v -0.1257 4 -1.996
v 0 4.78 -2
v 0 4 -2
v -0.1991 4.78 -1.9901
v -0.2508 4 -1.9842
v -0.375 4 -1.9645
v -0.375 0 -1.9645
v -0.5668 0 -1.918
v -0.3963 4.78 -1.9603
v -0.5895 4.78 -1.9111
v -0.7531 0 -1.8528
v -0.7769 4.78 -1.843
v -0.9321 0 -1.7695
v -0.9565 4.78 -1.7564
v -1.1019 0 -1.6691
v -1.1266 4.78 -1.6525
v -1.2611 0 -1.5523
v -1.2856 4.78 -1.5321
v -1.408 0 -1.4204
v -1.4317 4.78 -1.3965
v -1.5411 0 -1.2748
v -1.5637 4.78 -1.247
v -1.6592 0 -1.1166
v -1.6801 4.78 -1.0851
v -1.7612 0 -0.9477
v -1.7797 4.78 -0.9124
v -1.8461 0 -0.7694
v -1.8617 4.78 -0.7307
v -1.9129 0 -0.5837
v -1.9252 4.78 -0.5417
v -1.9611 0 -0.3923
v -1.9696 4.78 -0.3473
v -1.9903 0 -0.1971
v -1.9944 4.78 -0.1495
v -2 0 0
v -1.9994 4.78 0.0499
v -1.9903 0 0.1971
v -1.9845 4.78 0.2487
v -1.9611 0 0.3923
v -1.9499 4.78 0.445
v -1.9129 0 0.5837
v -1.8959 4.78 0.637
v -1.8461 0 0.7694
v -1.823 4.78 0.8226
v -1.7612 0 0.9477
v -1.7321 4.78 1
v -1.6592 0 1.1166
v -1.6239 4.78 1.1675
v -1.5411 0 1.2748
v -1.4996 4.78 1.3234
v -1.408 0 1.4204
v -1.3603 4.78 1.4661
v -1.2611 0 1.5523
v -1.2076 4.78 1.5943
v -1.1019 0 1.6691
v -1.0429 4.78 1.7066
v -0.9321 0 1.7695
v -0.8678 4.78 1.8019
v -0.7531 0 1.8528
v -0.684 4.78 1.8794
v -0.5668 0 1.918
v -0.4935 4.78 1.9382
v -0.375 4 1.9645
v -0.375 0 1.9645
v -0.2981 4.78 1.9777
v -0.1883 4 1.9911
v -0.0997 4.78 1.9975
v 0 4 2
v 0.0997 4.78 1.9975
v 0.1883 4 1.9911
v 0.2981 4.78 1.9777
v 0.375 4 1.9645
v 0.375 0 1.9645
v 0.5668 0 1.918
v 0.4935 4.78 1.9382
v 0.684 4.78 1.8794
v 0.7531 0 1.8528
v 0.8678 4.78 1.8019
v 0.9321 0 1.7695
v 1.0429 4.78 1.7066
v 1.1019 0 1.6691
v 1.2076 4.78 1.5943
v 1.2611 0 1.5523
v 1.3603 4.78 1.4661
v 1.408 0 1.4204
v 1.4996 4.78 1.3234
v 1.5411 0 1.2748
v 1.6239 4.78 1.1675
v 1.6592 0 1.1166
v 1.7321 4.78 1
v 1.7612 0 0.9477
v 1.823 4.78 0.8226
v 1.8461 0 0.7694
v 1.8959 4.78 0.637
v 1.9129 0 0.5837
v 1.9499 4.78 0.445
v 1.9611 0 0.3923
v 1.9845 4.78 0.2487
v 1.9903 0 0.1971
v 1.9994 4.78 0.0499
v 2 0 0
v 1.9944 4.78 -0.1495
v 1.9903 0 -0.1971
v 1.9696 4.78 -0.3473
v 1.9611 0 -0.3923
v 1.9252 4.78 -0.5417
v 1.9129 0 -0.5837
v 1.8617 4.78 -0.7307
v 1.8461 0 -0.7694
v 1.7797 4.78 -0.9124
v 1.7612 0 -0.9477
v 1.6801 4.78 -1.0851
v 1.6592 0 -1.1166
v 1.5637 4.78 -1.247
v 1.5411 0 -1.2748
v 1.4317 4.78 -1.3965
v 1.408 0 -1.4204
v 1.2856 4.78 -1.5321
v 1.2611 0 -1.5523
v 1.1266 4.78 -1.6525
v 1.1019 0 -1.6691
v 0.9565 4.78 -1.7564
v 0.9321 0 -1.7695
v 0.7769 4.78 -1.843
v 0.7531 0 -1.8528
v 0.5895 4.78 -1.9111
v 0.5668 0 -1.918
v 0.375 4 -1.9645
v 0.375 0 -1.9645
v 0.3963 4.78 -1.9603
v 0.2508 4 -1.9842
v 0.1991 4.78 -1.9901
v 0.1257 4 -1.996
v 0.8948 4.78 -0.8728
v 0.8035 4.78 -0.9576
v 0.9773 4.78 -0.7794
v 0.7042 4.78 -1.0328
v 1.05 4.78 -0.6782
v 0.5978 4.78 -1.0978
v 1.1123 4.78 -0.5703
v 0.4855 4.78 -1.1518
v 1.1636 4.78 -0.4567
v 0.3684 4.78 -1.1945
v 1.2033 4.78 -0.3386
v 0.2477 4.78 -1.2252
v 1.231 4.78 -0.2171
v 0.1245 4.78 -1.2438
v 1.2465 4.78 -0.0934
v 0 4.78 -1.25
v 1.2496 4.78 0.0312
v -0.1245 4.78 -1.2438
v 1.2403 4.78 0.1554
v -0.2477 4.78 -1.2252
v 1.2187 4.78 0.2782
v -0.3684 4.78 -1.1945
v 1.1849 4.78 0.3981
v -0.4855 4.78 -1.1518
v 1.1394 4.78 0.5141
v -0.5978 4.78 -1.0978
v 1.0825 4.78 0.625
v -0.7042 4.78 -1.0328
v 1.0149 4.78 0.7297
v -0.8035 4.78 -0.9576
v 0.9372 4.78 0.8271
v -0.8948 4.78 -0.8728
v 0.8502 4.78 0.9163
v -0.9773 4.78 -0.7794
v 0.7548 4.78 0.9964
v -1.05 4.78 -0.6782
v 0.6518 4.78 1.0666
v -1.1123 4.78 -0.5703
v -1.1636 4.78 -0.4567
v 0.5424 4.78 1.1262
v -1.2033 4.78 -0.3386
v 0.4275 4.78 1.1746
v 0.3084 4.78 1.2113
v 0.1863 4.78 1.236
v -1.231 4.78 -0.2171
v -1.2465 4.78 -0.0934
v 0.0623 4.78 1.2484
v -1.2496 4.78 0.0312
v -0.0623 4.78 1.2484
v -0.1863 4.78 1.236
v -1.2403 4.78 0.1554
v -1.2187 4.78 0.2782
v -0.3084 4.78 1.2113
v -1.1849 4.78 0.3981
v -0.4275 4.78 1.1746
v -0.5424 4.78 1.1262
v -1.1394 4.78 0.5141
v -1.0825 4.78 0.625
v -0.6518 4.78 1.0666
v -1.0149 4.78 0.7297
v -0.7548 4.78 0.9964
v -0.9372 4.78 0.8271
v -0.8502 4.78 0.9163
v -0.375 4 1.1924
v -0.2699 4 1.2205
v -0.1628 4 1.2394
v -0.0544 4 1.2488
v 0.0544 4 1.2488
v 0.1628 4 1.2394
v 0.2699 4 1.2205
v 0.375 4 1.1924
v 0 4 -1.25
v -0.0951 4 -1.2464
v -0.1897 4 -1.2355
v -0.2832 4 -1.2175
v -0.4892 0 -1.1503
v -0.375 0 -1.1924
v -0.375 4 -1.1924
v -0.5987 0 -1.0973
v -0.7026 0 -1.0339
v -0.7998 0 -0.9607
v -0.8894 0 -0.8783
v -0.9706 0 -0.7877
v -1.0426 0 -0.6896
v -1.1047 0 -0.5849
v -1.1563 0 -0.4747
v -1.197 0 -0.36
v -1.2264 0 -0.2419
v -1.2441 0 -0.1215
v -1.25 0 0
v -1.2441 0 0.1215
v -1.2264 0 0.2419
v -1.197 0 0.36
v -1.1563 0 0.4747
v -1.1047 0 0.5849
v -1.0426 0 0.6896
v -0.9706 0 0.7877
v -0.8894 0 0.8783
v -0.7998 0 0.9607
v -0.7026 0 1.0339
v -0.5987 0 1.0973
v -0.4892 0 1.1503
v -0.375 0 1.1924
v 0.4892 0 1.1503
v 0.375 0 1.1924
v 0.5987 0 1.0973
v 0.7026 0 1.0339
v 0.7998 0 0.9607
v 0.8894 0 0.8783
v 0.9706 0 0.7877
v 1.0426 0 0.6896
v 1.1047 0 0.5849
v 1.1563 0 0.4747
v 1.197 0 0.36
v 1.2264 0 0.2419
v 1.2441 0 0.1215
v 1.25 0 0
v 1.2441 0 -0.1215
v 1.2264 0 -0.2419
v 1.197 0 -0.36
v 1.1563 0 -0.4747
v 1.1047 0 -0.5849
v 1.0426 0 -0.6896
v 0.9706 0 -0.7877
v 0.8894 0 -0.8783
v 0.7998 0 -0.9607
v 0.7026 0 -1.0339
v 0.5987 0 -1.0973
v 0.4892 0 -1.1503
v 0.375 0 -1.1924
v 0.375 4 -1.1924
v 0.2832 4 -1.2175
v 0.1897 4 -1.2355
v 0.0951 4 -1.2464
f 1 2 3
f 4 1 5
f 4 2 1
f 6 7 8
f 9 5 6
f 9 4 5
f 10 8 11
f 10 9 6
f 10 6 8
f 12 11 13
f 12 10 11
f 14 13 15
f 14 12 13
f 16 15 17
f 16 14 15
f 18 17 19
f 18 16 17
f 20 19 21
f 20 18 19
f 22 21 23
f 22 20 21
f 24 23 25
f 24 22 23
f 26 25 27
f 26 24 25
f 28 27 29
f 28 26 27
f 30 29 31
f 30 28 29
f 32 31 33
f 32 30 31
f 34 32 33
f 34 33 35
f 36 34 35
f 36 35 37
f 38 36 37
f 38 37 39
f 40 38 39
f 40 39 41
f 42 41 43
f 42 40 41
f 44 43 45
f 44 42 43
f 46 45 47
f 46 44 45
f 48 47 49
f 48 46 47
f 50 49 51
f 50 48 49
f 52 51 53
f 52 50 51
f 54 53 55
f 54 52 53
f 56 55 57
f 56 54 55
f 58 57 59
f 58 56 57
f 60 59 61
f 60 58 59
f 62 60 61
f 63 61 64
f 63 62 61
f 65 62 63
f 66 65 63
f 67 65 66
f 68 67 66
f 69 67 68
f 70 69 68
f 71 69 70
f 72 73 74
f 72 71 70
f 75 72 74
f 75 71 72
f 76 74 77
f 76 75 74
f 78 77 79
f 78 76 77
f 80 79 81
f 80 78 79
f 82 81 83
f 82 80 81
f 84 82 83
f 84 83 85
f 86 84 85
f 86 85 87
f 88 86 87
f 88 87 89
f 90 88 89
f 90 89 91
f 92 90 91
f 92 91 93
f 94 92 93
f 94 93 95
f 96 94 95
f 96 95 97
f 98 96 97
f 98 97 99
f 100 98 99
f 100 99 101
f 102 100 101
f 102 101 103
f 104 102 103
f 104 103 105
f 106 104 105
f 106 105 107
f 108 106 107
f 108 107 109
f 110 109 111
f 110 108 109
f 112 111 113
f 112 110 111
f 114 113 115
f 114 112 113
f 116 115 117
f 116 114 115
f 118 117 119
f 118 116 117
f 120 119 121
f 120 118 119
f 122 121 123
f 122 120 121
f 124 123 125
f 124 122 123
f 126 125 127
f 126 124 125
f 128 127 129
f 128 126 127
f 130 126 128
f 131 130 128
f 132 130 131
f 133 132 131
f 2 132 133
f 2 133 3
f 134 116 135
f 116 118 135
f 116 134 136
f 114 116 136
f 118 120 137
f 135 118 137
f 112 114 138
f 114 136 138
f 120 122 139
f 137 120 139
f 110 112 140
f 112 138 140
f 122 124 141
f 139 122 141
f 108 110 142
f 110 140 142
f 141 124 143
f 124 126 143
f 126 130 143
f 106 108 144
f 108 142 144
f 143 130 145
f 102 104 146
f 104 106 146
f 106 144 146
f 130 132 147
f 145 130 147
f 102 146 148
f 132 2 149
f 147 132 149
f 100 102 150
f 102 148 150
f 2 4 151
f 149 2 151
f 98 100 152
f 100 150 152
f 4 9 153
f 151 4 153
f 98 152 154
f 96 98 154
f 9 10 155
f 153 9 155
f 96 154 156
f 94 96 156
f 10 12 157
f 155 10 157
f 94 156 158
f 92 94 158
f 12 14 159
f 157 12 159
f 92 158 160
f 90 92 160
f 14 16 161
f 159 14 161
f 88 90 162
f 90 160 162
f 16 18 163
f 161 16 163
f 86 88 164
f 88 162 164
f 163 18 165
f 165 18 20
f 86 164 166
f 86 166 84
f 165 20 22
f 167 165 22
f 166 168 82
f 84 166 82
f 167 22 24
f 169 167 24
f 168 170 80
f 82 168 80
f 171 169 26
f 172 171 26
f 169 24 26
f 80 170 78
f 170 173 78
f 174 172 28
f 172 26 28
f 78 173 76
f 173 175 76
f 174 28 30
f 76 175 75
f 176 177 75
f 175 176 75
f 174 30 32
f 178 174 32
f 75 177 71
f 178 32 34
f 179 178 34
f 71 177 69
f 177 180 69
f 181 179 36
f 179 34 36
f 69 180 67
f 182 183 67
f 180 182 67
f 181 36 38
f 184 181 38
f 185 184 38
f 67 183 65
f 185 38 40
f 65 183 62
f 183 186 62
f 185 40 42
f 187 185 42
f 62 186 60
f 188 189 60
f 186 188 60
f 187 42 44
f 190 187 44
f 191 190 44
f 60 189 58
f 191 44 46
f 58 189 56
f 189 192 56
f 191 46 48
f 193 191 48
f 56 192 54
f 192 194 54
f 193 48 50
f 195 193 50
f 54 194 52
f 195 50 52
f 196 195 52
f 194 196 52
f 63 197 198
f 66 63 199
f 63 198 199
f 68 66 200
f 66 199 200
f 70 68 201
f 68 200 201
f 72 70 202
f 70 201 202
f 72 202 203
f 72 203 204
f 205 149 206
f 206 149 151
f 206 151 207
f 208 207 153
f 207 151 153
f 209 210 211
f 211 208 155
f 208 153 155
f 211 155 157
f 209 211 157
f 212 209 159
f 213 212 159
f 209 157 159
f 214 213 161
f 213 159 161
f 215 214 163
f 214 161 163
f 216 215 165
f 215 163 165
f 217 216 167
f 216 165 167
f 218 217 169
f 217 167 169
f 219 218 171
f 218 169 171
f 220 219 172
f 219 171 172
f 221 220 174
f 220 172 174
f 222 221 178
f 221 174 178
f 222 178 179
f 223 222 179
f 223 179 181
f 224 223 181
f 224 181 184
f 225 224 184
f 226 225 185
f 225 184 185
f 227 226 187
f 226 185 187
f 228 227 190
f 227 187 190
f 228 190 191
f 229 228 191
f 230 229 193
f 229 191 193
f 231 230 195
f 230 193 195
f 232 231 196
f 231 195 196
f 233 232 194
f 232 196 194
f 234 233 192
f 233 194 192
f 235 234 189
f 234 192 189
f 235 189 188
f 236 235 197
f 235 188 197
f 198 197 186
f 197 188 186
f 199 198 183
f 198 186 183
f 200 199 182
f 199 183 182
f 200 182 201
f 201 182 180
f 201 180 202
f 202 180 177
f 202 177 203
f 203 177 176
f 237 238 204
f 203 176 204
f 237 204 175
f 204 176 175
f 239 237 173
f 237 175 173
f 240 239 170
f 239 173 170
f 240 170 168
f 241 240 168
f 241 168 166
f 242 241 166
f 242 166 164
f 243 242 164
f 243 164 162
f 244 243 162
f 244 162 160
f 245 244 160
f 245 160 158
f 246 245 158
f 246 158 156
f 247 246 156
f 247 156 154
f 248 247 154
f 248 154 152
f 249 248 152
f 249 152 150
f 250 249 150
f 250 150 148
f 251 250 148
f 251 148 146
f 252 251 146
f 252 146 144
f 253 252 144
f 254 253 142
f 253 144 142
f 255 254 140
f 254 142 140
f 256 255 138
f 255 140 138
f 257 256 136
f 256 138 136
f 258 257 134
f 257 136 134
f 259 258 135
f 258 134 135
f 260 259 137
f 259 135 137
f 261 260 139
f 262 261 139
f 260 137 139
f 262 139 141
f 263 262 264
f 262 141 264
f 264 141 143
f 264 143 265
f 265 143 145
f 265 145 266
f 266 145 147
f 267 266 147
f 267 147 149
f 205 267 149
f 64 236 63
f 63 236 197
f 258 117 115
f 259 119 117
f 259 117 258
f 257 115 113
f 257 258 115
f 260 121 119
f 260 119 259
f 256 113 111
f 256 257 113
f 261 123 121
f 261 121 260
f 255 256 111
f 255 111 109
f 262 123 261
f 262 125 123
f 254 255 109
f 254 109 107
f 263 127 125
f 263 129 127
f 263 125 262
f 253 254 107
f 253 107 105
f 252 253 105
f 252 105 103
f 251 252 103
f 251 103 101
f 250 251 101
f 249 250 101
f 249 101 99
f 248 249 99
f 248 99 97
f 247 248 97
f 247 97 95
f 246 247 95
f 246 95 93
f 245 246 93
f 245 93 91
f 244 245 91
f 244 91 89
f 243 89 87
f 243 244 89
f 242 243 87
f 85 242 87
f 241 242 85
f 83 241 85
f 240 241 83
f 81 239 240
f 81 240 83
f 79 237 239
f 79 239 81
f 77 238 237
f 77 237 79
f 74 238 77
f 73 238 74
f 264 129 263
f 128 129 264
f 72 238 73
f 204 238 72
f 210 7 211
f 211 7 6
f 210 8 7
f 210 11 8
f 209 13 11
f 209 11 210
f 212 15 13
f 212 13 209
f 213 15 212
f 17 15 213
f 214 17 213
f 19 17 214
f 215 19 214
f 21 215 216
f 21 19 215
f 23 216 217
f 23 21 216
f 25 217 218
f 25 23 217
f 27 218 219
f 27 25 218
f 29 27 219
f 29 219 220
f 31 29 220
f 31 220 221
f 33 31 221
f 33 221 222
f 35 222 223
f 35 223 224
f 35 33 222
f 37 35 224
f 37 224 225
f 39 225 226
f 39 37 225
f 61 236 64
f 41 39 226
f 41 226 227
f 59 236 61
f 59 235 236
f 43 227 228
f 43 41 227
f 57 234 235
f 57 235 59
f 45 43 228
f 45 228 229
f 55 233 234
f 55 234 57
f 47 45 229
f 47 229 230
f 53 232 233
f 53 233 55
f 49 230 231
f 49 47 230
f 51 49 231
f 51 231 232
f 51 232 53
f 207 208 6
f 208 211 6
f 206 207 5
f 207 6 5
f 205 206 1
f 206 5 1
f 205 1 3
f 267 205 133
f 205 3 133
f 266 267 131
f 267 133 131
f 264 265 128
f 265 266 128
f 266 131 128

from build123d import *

# Parameters (mm, degrees)
SKETCH2_W               = 0.75
SKETCH2_H               = 4.78
CUT_EXTRUDE1_DEPTH      = 4.78
CUT_EXTRUDE1_DEPTH_BACK = 4.78
SKETCH3_W               = 0.75
SKETCH3_H               = 4


with BuildPart() as part:
    # Sketch2 → Revolve1 (revolve)
    with BuildSketch(Plane.XY):
        with Locations((1.625, 2.39)):
            Rectangle(SKETCH2_W, SKETCH2_H)
    revolve(axis=Axis((0, -55, 0), (0, 1, 0)))

    # Sketch3 → Cut-Extrude1 (cut, two sides: drawn at the far end of the back side and taken through both)
    with BuildSketch(Plane.XY.offset(-CUT_EXTRUDE1_DEPTH_BACK)):
        with Locations((0, 2)):
            Rectangle(SKETCH3_W, SKETCH3_H)
    extrude(amount=CUT_EXTRUDE1_DEPTH + CUT_EXTRUDE1_DEPTH_BACK, mode=Mode.SUBTRACT)


solid = part.part
